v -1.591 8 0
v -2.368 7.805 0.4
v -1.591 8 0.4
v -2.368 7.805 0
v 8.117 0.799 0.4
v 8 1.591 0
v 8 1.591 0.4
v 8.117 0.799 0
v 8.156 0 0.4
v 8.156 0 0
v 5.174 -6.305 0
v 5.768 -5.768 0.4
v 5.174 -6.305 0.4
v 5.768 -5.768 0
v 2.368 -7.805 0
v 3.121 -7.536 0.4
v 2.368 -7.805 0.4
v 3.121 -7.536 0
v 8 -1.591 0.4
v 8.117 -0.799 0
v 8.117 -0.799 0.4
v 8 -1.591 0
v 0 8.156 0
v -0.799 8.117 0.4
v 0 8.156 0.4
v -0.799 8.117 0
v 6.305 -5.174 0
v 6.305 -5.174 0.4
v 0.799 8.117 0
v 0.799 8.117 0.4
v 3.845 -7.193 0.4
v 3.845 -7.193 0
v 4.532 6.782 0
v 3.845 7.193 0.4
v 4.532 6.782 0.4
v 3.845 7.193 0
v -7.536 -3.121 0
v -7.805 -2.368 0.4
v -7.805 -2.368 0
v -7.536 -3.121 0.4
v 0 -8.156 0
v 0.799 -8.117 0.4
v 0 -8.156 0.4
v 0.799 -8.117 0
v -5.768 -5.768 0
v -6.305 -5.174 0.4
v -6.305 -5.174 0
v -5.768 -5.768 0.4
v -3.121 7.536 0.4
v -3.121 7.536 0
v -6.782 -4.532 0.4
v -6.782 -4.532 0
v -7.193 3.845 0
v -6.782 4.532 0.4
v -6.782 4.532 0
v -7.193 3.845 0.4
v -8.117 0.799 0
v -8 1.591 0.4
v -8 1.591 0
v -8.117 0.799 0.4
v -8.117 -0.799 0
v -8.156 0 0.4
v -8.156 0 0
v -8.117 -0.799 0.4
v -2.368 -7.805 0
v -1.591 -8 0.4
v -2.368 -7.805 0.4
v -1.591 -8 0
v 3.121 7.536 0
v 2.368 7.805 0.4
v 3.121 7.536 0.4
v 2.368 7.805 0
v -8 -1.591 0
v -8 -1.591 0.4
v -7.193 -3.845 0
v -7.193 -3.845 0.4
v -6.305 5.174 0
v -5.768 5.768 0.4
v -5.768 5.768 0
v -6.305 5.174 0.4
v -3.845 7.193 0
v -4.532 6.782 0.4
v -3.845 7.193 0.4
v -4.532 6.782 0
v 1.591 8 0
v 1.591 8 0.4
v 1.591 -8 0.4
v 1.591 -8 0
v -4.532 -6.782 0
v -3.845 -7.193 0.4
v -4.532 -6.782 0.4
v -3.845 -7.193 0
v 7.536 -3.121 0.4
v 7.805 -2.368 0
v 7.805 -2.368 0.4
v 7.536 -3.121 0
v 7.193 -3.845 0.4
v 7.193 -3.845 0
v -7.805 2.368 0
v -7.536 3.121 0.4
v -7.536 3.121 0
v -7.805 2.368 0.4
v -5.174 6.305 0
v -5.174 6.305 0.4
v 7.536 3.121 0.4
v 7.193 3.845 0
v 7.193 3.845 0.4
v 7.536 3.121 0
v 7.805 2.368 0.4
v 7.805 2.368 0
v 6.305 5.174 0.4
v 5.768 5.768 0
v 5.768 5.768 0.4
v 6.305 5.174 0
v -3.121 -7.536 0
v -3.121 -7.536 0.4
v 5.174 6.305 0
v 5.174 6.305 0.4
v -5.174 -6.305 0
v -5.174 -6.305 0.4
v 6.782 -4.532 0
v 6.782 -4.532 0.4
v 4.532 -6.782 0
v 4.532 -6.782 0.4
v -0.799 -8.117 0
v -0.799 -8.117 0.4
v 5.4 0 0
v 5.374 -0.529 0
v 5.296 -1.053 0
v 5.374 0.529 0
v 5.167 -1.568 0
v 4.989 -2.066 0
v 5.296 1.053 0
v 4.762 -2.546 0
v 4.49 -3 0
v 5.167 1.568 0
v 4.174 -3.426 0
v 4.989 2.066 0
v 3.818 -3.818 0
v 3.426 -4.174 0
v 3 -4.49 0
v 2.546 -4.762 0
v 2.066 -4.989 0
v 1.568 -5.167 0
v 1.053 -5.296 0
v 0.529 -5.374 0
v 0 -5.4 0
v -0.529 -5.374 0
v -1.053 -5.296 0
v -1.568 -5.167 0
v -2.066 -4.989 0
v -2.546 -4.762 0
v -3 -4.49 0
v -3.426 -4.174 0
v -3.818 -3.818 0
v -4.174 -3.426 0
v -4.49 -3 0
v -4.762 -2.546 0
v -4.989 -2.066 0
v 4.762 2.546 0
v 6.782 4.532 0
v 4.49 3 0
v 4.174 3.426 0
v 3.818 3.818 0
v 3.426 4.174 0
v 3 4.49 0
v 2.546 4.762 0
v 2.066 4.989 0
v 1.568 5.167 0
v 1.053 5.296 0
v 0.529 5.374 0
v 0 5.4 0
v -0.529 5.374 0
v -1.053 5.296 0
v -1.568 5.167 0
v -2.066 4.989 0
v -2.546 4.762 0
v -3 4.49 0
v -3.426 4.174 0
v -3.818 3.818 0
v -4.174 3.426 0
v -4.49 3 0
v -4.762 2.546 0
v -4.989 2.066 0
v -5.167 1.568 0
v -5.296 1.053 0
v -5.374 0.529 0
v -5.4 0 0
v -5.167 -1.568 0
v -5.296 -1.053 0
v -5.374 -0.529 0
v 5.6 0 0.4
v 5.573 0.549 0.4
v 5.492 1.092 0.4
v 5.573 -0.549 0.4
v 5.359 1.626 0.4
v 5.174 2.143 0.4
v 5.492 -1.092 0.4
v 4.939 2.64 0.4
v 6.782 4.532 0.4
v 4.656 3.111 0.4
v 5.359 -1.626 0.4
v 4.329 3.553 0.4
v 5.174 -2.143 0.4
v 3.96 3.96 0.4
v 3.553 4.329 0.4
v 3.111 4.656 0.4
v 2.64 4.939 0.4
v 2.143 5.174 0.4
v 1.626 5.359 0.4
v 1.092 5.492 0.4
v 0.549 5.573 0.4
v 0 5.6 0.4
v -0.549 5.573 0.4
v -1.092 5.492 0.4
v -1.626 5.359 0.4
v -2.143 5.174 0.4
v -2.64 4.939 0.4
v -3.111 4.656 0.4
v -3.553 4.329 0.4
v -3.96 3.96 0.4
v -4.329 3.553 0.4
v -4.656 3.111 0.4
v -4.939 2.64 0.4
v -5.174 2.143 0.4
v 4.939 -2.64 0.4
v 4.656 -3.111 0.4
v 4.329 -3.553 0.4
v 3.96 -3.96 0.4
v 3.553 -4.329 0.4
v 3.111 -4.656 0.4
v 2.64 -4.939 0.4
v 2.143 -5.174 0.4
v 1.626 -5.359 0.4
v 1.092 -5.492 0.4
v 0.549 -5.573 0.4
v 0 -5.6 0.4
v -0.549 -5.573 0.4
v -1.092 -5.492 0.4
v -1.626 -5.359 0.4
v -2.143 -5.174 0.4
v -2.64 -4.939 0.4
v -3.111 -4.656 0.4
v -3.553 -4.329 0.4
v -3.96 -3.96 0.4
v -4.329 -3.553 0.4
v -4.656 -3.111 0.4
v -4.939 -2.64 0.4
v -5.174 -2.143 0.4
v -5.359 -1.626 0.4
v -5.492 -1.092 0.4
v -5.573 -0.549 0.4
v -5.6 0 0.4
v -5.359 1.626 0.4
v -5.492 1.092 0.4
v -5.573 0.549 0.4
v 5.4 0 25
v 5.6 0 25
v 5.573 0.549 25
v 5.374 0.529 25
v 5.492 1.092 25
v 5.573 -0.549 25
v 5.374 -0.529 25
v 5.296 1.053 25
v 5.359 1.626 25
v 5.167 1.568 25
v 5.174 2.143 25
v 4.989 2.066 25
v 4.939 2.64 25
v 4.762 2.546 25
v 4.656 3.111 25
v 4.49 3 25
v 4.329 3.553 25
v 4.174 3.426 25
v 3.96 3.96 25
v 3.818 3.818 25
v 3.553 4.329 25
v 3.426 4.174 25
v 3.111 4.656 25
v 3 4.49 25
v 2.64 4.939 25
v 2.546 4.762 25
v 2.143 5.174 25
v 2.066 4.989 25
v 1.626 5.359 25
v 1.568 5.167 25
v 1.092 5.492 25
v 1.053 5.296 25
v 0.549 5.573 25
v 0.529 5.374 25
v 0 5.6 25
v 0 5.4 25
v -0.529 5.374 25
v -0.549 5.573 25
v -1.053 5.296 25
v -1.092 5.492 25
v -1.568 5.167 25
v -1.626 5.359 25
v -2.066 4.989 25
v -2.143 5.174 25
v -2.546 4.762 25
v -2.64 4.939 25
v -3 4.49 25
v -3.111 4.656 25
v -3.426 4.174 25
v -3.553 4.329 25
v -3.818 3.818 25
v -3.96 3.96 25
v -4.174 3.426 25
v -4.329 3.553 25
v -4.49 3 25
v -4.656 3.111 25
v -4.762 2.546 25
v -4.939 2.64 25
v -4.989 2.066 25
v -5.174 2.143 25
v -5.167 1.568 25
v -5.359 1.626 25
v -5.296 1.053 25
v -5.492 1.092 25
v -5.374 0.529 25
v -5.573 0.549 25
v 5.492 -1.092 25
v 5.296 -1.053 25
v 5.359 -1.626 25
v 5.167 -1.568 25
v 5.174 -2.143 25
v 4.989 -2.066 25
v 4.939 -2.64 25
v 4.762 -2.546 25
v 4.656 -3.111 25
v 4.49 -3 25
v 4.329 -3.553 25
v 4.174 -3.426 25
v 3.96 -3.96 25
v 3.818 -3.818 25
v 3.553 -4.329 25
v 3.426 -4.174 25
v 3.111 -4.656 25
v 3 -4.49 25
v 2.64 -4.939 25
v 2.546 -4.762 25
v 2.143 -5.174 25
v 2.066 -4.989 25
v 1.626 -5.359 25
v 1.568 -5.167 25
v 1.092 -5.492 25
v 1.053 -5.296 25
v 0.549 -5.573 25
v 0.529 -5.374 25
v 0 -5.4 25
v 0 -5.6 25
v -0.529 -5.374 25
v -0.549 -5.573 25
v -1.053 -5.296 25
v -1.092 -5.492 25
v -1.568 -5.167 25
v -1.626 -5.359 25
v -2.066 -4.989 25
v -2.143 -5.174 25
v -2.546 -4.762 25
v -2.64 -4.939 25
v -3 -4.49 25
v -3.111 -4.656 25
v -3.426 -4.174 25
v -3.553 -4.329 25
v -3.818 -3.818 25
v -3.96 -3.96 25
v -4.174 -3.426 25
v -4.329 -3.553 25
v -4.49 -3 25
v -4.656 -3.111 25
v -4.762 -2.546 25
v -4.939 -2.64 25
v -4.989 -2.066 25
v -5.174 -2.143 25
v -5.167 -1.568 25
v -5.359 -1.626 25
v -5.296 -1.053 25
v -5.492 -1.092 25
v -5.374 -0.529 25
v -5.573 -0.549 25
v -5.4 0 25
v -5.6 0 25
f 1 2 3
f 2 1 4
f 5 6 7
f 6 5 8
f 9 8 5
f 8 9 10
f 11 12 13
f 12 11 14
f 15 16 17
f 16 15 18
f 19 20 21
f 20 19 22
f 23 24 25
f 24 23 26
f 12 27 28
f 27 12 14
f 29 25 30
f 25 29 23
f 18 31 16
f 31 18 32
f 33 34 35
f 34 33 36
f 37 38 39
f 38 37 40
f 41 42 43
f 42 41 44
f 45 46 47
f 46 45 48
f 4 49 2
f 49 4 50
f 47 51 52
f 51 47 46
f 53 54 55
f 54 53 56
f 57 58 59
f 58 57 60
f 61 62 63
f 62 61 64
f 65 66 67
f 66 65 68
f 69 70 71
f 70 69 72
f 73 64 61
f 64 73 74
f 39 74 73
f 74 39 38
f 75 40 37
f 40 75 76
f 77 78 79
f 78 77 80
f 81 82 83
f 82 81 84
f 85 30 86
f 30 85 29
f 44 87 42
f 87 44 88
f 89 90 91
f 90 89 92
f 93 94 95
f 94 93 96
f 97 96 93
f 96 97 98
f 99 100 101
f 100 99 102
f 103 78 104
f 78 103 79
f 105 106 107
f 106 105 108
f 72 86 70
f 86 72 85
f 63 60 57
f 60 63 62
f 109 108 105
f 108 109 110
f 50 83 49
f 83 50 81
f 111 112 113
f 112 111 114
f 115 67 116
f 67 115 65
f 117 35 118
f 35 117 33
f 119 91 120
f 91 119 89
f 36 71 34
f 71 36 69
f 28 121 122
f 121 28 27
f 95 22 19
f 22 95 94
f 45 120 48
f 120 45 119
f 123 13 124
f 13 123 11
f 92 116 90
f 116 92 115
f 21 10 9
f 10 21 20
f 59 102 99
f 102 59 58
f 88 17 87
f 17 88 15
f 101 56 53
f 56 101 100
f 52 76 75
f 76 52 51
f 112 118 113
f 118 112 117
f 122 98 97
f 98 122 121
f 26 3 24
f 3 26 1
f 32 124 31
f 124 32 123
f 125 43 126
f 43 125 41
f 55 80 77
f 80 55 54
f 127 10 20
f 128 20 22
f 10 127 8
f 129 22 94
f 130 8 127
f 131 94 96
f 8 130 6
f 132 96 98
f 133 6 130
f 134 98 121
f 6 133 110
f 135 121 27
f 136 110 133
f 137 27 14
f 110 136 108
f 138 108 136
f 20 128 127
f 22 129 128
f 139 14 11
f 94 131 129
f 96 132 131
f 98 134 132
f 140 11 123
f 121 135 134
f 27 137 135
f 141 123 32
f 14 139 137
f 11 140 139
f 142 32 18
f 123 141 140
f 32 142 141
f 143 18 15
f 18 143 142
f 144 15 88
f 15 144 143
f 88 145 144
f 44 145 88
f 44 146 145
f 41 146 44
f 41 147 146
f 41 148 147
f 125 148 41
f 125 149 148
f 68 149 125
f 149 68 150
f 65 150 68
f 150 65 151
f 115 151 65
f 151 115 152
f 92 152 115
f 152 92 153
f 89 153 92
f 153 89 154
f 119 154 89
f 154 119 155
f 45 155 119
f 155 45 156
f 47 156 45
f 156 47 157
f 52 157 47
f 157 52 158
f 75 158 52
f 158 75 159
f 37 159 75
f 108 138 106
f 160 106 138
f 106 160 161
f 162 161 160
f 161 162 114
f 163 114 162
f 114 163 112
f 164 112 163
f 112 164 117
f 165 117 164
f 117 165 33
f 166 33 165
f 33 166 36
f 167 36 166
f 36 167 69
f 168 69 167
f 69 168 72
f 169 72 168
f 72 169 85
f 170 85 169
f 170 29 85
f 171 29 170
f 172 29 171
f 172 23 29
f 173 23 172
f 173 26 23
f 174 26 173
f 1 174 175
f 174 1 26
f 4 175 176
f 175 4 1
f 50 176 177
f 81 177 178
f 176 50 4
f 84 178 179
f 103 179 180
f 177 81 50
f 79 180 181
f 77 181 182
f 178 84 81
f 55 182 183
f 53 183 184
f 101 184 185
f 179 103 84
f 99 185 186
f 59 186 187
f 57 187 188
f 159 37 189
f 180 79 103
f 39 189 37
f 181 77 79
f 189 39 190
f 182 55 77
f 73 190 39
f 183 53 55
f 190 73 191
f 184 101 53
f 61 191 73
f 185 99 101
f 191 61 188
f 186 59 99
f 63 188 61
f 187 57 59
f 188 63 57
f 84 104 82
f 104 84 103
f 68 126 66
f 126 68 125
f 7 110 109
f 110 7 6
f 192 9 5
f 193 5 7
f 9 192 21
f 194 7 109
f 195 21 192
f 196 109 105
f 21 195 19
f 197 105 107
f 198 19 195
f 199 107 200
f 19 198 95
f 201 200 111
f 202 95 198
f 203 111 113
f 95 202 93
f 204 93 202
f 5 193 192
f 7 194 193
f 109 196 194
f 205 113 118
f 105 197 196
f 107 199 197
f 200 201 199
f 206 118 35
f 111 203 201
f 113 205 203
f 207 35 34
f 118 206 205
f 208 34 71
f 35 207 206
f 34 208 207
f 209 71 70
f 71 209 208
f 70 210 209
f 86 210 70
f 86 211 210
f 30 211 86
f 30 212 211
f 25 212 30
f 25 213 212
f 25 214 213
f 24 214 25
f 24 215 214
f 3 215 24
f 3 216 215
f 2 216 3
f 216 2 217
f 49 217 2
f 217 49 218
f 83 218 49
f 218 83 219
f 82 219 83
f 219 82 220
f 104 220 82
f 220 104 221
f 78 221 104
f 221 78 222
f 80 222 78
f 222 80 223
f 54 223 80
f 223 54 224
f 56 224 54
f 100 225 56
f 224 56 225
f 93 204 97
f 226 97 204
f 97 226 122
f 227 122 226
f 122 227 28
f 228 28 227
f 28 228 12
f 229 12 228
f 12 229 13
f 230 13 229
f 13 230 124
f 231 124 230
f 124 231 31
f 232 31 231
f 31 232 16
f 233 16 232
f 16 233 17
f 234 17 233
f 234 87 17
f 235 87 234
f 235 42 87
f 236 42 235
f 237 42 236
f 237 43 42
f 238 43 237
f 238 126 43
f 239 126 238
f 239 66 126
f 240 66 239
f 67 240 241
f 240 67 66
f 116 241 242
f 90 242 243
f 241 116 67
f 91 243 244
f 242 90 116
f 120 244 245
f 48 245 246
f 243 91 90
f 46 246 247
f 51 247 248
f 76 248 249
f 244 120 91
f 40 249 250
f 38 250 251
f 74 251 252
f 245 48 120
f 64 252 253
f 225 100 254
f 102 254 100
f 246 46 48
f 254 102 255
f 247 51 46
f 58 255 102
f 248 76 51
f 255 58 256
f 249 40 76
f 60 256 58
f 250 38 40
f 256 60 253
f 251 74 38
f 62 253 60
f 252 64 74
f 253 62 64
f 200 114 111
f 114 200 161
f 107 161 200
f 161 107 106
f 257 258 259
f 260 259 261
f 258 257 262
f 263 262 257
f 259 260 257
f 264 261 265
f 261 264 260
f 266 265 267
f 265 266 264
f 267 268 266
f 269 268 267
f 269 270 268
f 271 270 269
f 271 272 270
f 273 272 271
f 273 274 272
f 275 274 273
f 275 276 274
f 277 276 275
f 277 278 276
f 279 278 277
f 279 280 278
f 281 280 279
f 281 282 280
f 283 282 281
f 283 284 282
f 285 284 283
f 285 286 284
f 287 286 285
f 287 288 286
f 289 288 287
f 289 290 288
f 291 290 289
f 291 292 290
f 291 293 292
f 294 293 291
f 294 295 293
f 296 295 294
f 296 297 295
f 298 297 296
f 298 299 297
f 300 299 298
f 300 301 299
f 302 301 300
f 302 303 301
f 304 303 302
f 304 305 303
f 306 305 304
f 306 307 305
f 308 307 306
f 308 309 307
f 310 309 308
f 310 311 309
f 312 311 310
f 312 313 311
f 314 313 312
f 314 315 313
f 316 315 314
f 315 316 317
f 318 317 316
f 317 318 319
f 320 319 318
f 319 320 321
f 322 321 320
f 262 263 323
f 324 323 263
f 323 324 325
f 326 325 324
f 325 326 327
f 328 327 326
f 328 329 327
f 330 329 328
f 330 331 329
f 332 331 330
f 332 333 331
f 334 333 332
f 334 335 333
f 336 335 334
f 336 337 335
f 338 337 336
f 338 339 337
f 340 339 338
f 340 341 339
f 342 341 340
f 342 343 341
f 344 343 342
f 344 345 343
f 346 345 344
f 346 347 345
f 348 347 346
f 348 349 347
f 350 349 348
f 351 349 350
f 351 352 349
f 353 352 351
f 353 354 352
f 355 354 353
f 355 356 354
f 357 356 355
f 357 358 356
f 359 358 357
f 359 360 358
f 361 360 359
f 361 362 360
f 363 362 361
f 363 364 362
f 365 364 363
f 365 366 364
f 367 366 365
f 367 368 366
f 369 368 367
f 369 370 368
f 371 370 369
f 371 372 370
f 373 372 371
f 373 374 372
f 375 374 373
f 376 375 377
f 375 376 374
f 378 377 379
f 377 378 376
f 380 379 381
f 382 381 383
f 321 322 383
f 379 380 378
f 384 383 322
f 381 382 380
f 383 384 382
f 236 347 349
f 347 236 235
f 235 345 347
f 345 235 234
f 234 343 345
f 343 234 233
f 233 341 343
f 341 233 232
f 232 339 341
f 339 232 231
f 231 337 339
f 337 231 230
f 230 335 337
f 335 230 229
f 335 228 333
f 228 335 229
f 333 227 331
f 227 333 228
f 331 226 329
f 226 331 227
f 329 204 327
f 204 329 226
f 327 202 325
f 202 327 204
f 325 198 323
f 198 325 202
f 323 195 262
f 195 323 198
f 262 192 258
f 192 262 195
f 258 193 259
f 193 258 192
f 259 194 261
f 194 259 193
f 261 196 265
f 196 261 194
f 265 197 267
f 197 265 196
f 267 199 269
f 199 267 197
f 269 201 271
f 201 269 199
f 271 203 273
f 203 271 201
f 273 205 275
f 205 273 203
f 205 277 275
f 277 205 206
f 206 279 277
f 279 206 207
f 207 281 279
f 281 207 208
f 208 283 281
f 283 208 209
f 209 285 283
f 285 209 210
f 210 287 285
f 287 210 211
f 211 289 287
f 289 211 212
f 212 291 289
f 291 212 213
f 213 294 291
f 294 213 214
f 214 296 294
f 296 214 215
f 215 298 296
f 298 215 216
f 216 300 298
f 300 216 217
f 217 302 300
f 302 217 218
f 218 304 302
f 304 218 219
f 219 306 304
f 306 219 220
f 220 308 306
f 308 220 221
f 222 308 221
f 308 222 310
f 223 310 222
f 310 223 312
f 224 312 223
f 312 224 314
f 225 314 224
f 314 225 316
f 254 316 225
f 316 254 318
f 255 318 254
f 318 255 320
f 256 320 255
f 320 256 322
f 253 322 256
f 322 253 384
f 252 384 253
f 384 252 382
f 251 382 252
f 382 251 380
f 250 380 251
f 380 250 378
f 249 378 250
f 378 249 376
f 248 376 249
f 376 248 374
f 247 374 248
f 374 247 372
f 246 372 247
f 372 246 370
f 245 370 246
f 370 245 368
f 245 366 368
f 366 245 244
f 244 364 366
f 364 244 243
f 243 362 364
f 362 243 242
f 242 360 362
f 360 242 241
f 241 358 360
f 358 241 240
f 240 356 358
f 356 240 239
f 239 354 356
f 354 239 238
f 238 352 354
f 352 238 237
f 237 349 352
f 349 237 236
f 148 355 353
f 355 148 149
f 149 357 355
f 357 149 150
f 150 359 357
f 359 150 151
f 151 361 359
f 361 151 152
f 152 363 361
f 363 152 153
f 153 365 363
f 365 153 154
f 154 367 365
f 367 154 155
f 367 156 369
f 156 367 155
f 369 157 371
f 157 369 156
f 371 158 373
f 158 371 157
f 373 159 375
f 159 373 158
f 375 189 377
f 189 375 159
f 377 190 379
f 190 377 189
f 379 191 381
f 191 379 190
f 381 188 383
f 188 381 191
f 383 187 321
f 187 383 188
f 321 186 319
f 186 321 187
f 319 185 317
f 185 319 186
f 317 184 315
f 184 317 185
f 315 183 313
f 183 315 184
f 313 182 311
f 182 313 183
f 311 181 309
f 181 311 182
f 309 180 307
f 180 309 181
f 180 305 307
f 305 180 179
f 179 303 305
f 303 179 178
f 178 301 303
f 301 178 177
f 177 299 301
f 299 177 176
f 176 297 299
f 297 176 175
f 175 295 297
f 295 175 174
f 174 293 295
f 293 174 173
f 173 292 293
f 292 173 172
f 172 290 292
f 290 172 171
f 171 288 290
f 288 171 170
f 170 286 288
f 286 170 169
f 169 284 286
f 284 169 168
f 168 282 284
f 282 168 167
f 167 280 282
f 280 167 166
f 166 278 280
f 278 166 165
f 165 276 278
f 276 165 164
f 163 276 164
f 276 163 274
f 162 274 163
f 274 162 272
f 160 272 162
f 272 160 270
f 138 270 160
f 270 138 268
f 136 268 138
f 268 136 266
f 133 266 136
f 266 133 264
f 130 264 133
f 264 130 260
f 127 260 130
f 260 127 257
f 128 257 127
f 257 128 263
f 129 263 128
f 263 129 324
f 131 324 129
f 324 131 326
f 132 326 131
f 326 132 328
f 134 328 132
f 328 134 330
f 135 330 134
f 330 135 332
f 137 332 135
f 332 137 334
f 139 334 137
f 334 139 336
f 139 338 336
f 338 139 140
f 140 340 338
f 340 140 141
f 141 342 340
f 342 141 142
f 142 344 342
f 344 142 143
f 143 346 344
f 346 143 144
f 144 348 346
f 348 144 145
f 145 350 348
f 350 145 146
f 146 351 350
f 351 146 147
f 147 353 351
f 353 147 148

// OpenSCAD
$fn = 64;

nozzle_diameter = 0.4;

// outer diameter of the tube we're using.
tube_diameter = 10.0;

// Tolerances to add to an inner diameter so it fits over
tight_fit = 0.2;
loose_fit = 0.4;

module tube(inner_diameter, outer_diameter, length){
    linear_extrude(length){
        difference(){
            circle(d = outer_diameter);
            circle(d = inner_diameter);
        }
    }
}



module base(inner_diameter, outer_diameter, thickness) {
    difference(){
        linear_extrude(thickness) {
            circle(d = outer_diameter);
        }
        linear_extrude(thickness + 1, center = true) {
            circle(d = inner_diameter);
        }
    }
}


// Makes one half of a magnet coil winder.
// Print 2 for a full winder
// Use a calculator to find the length and height to use:
// https://www.accelinstruments.com/Magnetic/Magnetic-field-calculator.html
module half_coil(coil_length, coil_height) {
    coil_diameter = tube_diameter + nozzle_diameter + loose_fit;
    base_diameter = coil_diameter + coil_height;
    length = coil_length / 2;
    
    base(coil_diameter, base_diameter, nozzle_diameter);    
    tube(coil_diameter, coil_diameter + nozzle_diameter, length);
}

half_coil(50, 5.513);
